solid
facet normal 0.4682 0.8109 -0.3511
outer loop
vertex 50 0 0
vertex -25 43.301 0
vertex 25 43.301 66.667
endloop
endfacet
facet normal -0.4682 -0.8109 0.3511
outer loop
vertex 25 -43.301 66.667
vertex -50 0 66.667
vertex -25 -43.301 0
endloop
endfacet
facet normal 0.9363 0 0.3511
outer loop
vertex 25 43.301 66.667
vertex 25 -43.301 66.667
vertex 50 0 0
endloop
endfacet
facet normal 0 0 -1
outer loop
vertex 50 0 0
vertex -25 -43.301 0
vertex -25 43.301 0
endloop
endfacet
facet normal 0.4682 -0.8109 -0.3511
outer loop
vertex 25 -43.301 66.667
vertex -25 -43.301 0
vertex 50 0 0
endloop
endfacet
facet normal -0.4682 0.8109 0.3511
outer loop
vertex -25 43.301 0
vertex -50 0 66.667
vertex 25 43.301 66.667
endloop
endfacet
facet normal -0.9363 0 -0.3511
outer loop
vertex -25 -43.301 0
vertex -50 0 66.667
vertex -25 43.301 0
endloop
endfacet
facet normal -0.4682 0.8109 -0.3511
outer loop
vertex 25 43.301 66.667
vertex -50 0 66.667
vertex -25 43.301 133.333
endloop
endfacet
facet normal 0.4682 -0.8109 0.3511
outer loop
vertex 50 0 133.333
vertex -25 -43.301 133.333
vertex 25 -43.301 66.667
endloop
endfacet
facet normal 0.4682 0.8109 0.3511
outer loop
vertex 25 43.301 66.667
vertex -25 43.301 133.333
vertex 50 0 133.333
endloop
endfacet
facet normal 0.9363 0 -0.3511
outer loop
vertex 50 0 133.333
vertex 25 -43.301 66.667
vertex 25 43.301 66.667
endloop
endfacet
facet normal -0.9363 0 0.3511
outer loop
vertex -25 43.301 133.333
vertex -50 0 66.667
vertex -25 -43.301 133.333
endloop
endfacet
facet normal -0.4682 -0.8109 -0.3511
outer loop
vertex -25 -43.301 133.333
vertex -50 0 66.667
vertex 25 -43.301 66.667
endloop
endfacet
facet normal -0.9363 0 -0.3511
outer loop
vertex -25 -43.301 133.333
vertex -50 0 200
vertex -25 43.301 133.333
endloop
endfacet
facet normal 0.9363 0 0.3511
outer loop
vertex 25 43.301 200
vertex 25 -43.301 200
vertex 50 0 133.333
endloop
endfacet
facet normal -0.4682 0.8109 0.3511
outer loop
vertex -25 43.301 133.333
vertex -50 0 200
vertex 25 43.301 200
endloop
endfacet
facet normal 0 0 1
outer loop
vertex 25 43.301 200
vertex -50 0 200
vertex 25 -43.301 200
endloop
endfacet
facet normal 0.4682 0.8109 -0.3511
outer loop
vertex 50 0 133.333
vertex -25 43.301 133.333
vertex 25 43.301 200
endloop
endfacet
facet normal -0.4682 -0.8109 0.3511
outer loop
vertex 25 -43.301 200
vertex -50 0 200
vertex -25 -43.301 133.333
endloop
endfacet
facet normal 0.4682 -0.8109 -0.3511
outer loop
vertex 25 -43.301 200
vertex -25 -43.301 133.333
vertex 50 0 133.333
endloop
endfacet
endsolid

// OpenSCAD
//Octaedron Generator by David_LG 03/02/2017
// this isn't a precise model, but it seems ok for 3D printing purposes

Diameter=100; // Diameter of the circumbscribed circle
Total_Height=200; // Total Heigth
Number_of_octaedrons=3; // Total number of octaedrons to pile up

Height=Total_Height/Number_of_octaedrons;

for(i=[0:Number_of_octaedrons-1]){
    rotate([0,0,60*i])translate([0,0,Height*i])hull(){
        cylinder(r=Diameter/2,h=.0001, $fn=3); 
        rotate([0,0,60])translate([0,0,Height])cylinder(r=Diameter/2,h=.0001, $fn=3); 
    }
}
